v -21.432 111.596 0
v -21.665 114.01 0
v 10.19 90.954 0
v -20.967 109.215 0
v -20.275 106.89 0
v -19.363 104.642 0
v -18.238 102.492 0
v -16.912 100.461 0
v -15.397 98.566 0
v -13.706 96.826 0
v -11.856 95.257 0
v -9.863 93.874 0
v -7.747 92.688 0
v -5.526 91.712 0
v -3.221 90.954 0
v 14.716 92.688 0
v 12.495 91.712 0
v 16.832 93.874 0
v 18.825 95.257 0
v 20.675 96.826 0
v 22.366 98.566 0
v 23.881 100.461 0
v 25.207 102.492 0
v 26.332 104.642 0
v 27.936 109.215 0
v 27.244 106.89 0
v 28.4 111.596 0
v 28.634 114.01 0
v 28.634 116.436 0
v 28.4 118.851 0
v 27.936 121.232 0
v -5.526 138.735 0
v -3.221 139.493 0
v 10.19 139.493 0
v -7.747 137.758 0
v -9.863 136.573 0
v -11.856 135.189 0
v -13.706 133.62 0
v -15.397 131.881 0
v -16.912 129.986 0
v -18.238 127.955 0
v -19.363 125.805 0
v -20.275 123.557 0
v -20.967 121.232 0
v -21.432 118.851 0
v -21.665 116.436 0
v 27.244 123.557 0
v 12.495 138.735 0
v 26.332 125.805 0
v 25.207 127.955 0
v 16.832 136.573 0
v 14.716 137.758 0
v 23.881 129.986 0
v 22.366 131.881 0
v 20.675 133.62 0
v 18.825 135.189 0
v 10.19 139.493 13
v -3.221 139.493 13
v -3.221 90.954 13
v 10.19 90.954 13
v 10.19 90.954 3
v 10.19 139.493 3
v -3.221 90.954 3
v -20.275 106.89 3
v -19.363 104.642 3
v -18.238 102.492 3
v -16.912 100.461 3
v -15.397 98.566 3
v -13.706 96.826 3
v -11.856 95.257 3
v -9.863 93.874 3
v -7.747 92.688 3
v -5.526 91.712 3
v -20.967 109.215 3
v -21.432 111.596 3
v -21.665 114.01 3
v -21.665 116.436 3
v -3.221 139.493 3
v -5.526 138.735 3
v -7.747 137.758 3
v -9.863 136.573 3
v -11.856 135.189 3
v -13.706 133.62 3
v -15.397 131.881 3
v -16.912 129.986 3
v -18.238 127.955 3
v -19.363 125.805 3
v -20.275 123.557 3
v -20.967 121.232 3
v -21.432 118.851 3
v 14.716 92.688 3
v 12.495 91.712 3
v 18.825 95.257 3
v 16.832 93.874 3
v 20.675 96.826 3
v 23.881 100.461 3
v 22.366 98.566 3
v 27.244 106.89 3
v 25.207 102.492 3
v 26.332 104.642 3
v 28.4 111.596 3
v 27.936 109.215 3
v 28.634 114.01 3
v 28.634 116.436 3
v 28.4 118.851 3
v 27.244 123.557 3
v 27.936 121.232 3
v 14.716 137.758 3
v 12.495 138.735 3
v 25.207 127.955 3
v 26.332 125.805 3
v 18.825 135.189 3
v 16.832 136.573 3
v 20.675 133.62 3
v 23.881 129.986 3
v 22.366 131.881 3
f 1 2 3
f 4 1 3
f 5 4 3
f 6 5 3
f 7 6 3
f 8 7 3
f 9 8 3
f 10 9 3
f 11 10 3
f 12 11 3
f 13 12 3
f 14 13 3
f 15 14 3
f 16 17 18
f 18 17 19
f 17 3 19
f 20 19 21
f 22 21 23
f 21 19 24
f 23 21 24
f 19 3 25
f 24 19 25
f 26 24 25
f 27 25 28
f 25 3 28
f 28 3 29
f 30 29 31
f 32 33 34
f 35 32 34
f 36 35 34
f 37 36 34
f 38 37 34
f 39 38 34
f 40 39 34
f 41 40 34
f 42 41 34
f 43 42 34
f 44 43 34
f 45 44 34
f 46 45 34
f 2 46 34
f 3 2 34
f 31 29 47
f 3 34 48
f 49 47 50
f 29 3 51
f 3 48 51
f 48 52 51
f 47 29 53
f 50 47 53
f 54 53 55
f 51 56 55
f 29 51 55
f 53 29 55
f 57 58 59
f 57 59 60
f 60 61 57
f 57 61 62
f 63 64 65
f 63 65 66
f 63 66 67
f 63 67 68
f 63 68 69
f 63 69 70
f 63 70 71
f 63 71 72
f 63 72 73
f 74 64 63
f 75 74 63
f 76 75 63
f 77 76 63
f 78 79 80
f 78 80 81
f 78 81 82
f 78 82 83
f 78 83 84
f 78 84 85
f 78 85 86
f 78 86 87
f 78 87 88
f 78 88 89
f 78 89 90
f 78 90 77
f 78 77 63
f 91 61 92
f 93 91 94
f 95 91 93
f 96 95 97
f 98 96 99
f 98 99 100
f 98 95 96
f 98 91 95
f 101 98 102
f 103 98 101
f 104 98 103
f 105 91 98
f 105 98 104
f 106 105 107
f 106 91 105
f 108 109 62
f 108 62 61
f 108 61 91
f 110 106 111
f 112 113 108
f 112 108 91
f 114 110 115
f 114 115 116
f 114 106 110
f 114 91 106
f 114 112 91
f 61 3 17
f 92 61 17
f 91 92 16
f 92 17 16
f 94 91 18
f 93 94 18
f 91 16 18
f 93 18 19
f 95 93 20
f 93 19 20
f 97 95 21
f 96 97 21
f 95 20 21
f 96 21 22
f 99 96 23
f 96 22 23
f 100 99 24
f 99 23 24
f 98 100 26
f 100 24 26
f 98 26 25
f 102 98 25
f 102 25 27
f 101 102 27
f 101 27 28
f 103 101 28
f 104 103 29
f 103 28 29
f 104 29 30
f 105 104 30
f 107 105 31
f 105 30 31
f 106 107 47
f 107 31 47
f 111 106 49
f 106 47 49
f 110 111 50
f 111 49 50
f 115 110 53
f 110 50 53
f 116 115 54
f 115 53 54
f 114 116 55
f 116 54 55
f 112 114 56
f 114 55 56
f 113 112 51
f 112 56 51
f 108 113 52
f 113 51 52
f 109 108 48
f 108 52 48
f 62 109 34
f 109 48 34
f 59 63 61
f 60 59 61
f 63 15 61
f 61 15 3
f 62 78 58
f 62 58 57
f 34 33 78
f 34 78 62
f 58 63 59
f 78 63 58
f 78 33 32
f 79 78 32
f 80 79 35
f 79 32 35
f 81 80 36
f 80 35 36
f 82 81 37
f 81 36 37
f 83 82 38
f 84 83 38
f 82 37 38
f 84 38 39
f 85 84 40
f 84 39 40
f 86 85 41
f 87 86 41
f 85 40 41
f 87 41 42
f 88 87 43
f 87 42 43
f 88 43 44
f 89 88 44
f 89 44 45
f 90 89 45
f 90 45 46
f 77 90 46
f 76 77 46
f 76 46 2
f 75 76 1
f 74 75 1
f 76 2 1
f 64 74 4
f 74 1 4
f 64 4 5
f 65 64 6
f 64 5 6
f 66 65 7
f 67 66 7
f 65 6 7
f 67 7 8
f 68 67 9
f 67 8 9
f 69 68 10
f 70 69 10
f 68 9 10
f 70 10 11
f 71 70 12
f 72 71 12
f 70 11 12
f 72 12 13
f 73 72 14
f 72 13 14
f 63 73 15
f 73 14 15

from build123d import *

# Parameters (mm, degrees)
BOSS_EXTRUDE4_DEPTH = 3
SKETCH2_W           = 13.411682353
SKETCH2_H           = 48.538644398
BOSS_EXTRUDE5_DEPTH = 10


with BuildPart() as part:
    # Sketch1 → Boss-Extrude4 (new body)
    with BuildSketch(Plane.XY):
        with BuildLine():
            Line((10.190210498, 139.492737182), (-3.221471855, 139.492737182))
            ThreePointArc((-3.221471855, 139.492737182), (-21.694357927, 115.223414983), (-3.221471855, 90.954092784))
            Line((-3.221471855, 90.954092784), (10.190210498, 90.954092784))
            ThreePointArc((10.190210498, 90.954092784), (28.663096571, 115.223414983), (10.190210498, 139.492737182))
        make_face()
    extrude(amount=BOSS_EXTRUDE4_DEPTH)

    # Sketch2 → Boss-Extrude5 (add)
    with BuildSketch(Plane.XY.offset(3)):
        with Locations((3.484369322, 115.223414983)):
            Rectangle(SKETCH2_W, SKETCH2_H)
    extrude(amount=BOSS_EXTRUDE5_DEPTH)


solid = part.part
